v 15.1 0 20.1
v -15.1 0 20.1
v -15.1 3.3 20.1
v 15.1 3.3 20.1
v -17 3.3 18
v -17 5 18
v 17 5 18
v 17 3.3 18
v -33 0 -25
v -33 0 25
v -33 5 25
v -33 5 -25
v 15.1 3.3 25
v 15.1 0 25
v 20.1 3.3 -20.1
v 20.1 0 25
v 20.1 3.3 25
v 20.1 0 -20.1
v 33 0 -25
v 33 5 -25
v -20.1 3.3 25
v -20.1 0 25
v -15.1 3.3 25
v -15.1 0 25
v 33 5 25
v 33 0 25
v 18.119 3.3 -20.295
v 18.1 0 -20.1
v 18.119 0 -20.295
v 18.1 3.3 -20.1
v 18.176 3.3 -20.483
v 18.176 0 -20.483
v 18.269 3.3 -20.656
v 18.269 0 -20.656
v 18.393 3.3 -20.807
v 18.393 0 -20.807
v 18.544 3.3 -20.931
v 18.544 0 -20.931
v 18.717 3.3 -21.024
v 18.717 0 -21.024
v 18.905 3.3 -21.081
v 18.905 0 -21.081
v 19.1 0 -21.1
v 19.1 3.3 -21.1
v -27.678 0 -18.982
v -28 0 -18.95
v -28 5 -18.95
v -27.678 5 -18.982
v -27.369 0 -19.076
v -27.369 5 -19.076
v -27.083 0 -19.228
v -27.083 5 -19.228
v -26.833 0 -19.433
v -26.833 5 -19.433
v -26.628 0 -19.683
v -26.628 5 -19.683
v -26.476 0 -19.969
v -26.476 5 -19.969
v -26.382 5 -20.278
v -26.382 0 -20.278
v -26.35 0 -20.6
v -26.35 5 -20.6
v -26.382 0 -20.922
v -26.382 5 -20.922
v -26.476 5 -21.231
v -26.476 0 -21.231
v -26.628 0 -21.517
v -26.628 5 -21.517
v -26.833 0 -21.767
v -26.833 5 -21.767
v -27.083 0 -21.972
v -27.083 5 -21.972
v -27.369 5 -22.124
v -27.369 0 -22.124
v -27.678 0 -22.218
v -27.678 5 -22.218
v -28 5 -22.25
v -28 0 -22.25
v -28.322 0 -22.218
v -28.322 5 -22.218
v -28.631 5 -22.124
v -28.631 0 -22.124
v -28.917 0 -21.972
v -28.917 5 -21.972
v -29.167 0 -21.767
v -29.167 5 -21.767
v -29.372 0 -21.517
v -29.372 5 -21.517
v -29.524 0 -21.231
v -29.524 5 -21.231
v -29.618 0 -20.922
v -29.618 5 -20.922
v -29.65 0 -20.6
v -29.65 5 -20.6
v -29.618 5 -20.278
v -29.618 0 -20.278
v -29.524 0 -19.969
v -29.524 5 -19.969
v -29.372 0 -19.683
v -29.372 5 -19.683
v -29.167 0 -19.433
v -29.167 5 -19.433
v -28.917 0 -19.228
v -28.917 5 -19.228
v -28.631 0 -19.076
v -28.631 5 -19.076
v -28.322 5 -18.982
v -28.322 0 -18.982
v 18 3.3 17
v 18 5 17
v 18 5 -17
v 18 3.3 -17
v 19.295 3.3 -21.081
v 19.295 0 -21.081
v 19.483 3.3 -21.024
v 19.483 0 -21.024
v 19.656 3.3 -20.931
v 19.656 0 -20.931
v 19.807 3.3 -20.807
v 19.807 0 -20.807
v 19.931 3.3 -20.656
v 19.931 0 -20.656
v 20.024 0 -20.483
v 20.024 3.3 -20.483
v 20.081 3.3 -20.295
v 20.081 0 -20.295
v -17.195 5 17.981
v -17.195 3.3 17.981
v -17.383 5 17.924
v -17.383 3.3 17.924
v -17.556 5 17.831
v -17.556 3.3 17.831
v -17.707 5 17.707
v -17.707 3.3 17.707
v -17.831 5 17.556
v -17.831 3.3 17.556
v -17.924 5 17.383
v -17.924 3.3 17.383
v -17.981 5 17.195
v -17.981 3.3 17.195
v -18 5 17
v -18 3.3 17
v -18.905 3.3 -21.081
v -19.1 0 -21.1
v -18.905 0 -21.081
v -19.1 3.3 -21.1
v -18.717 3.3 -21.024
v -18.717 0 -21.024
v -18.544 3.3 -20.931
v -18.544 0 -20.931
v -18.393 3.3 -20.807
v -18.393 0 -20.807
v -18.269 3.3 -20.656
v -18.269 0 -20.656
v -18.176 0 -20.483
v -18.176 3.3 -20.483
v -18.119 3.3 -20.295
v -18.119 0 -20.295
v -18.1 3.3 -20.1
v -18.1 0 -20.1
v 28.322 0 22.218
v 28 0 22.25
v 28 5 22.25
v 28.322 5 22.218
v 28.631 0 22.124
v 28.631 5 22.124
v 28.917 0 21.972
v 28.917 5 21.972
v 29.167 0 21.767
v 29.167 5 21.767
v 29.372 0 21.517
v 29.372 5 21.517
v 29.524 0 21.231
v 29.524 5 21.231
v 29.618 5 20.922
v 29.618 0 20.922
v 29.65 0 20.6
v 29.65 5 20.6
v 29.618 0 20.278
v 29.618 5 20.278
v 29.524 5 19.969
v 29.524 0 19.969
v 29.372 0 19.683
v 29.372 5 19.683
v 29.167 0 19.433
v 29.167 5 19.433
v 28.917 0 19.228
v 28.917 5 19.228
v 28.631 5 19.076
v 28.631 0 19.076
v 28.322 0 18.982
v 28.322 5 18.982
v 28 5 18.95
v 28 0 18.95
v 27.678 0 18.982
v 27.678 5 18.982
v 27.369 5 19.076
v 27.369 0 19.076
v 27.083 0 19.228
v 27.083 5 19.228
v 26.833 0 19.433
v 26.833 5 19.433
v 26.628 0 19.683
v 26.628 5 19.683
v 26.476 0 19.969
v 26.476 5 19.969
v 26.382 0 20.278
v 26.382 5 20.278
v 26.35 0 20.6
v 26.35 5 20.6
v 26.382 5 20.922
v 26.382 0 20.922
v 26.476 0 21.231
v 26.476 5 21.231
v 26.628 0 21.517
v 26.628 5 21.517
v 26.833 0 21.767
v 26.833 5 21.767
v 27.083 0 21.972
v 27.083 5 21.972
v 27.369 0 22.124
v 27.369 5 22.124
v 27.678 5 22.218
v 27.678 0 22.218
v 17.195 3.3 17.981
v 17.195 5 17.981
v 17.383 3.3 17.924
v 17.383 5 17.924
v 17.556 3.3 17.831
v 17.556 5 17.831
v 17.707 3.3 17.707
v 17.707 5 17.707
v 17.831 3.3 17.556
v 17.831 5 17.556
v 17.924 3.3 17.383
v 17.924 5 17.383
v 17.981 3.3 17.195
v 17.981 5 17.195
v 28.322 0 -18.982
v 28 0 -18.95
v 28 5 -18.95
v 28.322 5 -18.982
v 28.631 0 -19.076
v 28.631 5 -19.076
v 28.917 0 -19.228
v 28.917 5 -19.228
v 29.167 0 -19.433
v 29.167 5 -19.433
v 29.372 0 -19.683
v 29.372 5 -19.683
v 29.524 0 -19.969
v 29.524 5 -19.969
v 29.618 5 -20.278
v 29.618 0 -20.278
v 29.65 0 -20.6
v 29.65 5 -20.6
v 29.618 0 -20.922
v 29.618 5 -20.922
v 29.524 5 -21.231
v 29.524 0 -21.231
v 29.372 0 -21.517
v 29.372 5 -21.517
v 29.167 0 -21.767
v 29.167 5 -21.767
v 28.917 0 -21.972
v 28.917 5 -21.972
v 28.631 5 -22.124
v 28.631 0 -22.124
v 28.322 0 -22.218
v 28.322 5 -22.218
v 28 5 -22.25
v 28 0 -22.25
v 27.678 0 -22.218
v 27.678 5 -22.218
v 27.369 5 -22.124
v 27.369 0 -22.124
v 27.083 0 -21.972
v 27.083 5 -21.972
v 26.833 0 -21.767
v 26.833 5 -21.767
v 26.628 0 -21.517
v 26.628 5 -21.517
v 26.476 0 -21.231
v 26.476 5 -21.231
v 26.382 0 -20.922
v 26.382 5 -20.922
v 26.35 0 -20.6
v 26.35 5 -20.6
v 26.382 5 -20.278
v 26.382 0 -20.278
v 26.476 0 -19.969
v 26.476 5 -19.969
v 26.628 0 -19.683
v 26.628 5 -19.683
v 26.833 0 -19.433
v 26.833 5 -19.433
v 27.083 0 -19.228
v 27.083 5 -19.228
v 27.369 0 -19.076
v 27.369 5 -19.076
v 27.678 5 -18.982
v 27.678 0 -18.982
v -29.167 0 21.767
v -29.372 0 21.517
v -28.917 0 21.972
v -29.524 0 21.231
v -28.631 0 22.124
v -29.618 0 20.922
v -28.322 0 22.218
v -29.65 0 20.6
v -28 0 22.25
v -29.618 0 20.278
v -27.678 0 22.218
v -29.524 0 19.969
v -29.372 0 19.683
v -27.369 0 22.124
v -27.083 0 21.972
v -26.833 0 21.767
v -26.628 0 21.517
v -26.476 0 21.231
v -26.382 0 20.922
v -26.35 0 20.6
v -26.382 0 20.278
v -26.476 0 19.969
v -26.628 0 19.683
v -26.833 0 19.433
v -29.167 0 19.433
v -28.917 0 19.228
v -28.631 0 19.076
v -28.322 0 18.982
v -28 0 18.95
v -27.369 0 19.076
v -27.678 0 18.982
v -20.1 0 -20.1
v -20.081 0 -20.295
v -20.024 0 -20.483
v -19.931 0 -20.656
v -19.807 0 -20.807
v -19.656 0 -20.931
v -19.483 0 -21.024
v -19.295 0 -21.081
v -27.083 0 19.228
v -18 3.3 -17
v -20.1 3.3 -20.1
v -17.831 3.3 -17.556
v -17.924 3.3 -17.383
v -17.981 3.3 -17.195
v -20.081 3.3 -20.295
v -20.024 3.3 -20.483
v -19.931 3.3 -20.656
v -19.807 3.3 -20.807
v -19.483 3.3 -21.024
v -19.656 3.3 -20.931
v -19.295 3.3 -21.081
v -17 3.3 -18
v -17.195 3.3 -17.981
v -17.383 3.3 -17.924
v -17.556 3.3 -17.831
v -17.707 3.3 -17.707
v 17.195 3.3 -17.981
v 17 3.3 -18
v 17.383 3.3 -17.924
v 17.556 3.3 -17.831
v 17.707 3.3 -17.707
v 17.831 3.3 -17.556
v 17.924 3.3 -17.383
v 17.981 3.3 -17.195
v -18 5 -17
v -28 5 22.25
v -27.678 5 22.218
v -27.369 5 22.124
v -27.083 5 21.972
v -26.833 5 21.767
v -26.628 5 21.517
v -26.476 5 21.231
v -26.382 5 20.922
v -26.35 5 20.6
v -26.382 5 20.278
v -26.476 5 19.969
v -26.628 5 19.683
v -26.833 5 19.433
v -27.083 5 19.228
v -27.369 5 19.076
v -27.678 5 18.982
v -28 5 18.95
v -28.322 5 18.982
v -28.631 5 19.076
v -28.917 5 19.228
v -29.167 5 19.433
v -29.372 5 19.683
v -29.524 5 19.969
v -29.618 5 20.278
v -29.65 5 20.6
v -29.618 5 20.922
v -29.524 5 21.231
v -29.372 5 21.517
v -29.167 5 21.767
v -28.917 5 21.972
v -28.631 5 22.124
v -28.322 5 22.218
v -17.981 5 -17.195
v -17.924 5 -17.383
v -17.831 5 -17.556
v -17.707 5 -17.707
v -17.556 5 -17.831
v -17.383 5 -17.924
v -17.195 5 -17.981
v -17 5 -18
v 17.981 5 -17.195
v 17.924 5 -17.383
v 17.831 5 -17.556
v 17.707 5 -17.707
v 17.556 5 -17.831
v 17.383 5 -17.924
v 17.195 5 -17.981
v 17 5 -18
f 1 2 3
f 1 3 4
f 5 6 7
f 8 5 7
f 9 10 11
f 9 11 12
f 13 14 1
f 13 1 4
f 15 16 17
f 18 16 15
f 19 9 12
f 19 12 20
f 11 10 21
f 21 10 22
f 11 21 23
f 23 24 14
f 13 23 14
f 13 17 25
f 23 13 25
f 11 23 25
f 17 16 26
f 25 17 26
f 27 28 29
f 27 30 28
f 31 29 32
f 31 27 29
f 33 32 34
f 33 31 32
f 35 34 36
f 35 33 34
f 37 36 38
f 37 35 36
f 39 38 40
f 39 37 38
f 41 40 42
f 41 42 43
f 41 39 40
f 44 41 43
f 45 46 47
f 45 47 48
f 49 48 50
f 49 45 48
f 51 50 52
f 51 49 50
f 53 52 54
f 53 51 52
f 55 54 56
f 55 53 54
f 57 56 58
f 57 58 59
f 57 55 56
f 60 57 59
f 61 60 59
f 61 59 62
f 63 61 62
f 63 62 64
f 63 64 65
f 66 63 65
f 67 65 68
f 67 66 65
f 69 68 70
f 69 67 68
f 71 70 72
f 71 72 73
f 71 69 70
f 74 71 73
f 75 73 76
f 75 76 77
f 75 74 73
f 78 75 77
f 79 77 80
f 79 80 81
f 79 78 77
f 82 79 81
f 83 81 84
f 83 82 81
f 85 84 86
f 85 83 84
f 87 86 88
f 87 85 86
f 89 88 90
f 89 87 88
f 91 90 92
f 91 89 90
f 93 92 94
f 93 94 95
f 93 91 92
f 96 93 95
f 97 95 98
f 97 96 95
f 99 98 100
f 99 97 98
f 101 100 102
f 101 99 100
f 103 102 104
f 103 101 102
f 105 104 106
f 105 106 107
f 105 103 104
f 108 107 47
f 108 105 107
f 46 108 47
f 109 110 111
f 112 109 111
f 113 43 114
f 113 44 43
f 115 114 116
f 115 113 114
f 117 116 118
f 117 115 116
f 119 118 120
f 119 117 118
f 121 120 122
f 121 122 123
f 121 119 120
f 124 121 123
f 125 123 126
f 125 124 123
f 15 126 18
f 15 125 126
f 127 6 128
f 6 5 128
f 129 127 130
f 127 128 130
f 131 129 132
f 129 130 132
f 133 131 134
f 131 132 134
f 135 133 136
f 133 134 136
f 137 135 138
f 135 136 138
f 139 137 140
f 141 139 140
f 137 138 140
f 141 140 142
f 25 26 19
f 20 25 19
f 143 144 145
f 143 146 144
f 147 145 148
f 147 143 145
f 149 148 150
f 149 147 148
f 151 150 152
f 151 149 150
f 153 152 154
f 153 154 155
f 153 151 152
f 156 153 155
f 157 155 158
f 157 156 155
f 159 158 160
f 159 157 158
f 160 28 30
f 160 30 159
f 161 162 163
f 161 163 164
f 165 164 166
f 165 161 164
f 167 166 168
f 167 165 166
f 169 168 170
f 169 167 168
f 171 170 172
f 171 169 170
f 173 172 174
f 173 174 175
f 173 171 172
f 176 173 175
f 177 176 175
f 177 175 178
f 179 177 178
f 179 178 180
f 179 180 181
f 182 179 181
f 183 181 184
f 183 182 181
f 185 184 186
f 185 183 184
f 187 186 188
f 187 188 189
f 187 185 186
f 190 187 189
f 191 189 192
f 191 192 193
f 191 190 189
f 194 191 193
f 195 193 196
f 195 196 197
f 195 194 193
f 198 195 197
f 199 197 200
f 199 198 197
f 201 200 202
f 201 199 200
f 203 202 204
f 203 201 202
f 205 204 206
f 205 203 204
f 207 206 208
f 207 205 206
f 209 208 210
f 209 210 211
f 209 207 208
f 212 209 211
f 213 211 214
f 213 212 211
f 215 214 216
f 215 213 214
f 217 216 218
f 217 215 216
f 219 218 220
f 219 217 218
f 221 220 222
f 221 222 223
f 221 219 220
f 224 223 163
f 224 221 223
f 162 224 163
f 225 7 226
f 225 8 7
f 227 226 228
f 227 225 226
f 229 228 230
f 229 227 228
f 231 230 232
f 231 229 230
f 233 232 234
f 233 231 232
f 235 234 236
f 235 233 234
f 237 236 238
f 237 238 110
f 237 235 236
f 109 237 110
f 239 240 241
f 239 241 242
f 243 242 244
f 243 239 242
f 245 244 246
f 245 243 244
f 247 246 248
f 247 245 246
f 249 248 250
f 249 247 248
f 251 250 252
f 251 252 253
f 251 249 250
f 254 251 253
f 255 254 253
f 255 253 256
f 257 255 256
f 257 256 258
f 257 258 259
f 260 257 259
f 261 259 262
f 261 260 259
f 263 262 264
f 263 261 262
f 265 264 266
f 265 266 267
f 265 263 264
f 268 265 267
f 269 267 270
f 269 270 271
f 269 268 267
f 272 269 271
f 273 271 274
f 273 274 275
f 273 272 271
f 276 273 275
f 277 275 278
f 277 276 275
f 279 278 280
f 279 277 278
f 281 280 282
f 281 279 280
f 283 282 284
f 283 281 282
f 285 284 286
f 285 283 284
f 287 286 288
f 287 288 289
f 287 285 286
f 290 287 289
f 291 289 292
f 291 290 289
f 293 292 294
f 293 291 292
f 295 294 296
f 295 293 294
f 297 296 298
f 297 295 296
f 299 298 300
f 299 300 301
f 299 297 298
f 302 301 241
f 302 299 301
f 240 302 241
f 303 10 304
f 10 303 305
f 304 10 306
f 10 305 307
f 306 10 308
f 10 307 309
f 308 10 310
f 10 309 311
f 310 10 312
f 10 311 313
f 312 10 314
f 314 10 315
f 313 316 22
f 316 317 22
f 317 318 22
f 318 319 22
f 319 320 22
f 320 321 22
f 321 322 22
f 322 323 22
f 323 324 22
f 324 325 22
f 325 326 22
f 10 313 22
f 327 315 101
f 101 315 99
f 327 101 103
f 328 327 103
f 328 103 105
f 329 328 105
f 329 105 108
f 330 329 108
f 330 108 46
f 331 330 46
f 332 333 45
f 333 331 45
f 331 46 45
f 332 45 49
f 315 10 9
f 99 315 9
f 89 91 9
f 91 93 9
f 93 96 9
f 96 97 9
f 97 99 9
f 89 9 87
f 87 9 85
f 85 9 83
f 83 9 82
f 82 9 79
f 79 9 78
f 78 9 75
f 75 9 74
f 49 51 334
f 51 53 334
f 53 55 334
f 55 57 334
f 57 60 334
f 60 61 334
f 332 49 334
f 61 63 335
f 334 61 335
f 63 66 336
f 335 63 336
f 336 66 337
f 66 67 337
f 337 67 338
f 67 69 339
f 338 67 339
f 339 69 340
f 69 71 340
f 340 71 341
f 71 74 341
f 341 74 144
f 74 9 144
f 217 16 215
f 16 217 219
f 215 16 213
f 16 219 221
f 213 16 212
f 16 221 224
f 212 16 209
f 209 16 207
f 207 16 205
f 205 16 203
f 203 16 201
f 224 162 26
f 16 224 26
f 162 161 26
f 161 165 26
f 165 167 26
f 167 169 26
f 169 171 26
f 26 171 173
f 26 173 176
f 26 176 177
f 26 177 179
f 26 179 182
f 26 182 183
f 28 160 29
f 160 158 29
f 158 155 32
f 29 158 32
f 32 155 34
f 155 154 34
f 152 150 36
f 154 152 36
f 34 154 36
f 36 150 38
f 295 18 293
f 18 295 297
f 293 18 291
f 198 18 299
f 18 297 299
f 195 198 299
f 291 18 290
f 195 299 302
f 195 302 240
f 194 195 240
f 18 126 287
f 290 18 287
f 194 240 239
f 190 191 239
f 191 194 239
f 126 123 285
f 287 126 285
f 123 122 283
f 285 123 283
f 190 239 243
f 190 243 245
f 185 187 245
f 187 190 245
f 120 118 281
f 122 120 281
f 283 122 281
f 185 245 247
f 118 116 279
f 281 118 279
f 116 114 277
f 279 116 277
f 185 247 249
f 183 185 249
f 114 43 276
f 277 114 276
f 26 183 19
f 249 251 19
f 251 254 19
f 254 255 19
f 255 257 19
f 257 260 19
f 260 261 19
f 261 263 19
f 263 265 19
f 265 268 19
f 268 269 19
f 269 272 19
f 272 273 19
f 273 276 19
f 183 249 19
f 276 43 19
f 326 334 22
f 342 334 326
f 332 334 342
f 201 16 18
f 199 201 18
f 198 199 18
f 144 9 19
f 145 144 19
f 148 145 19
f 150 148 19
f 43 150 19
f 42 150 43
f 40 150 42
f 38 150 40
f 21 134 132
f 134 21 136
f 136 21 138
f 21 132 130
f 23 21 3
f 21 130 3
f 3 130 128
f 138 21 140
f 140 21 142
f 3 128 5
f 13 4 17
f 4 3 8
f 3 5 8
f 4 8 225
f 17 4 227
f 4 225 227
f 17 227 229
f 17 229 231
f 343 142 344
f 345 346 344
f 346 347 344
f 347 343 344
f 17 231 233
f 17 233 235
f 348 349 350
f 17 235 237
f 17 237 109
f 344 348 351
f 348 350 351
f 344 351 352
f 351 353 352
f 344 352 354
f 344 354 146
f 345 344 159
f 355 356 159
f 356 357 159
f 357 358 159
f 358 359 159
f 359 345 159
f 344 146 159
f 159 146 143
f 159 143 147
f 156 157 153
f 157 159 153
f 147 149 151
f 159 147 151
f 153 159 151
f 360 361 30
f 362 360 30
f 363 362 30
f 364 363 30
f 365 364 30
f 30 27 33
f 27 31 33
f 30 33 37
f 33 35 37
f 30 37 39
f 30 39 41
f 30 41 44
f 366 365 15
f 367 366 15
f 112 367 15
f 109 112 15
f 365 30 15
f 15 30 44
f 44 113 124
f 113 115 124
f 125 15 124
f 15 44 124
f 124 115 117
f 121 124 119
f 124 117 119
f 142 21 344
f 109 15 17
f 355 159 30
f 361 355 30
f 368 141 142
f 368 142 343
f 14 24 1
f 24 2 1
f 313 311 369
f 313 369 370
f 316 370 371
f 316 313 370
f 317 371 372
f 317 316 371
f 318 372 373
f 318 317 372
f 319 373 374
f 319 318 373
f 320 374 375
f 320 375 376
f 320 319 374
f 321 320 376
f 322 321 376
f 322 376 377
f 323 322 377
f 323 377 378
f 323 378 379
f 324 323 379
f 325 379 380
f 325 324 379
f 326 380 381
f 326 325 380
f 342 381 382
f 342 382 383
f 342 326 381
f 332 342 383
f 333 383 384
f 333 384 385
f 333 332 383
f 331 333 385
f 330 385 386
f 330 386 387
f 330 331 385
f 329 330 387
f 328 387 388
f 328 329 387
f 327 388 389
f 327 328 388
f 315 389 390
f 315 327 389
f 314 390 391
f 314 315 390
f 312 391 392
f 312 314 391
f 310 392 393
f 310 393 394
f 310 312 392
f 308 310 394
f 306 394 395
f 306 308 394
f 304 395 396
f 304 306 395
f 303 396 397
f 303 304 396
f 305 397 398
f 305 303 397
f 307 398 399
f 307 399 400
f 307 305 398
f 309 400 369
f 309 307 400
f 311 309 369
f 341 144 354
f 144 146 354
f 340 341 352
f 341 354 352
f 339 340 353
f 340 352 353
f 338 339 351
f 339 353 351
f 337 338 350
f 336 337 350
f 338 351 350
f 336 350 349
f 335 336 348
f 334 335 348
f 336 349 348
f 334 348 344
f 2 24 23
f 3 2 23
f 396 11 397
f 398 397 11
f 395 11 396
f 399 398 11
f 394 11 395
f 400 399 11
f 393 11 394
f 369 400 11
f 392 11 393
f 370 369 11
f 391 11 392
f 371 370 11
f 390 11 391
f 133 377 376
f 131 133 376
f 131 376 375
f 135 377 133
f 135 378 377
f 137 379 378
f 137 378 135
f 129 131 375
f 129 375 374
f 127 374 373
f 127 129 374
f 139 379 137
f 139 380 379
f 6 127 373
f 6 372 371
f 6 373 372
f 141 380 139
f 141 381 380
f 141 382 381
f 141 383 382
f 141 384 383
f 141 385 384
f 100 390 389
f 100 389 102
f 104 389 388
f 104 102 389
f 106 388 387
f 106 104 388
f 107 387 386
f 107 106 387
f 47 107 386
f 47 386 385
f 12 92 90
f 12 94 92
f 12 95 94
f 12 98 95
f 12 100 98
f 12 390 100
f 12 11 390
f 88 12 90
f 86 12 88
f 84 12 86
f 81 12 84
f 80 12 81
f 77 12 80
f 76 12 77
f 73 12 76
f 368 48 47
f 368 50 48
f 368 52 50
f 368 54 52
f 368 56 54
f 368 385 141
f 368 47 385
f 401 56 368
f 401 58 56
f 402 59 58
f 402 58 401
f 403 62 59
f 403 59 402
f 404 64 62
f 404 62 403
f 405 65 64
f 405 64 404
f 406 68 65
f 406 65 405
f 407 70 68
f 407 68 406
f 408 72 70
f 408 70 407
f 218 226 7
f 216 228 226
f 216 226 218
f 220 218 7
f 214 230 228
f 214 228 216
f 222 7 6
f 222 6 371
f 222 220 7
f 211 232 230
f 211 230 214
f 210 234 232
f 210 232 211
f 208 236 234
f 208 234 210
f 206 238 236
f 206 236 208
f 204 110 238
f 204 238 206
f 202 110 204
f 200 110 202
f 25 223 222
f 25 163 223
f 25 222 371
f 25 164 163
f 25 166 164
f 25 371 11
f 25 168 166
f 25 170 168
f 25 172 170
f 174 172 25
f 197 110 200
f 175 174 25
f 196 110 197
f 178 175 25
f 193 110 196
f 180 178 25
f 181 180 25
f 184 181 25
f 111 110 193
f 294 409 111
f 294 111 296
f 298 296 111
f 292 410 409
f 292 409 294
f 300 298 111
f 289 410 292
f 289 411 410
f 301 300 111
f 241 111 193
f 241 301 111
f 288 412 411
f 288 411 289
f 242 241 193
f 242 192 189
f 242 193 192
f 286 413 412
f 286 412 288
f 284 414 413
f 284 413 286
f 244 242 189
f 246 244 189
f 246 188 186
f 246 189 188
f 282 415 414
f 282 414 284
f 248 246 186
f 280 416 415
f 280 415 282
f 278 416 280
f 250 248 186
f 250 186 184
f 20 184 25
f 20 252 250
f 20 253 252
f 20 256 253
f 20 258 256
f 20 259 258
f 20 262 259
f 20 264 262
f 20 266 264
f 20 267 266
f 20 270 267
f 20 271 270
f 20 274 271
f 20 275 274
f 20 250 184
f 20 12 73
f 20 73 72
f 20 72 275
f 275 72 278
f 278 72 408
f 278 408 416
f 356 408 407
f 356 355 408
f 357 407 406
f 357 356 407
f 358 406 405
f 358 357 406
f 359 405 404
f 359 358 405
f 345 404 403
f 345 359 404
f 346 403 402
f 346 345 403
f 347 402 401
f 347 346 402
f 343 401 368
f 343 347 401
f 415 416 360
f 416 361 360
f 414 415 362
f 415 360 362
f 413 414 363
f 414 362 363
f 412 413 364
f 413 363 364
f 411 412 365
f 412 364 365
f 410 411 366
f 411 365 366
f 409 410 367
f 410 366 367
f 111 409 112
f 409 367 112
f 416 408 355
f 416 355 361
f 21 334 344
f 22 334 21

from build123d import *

# Parameters (mm, degrees)
SKETCH1_W           = 66
SKETCH1_H           = 50
SKETCH1_R           = 1.65
BOSS_EXTRUDE1_DEPTH = 5
SKETCH2_W           = 36
SKETCH2_H           = 36
BOSS_EXTRUDE2_DEPTH = 1.7
CUT_EXTRUDE1_REACH  = 62.117
SKETCH3_W           = 5
SKETCH3_H           = 3.3
FILLET1_R           = 1


with BuildPart() as part:
    # Sketch1 → Boss-Extrude1 (new body)
    with BuildSketch(Plane(origin=(0, 0, 0), x_dir=(1, 0, 0), z_dir=(0, 1, 0))):
        Rectangle(SKETCH1_W, SKETCH1_H)
        with Locations(Location((-28, 20.6, 0), (0, 0, 270))):
            Circle(SKETCH1_R, mode=Mode.SUBTRACT)
        with Locations(Location((28, 20.6, 0), (0, 0, 270))):
            Circle(SKETCH1_R, mode=Mode.SUBTRACT)
        with Locations(Location((-28, -20.6, 0), (0, 0, 270))):
            Circle(SKETCH1_R, mode=Mode.SUBTRACT)
        with Locations(Location((28, -20.6, 0), (0, 0, 270))):
            Circle(SKETCH1_R, mode=Mode.SUBTRACT)
        Polygon((20.1, -20.1), (20.1, 21.1), (18.1, 21.1), (18.1, 20.1), (-18.1, 20.1), (-18.1, 21.1), (-20.1, 21.1), (-20.1, -20.1), align=None, mode=Mode.SUBTRACT)
    extrude(amount=BOSS_EXTRUDE1_DEPTH)

    # Sketch2 → Boss-Extrude2 (add)
    with BuildSketch(Plane(origin=(0, 5, 0), x_dir=(1, 0, 0), z_dir=(0, 1, 0))):
        Polygon((-20.1, 21.1), (-20.1, -20.1), (20.1, -20.1), (20.1, 21.1), (18.1, 21.1), (18.1, 20.1), (-18.1, 20.1), (-18.1, 21.1), align=None)
        Rectangle(SKETCH2_W, SKETCH2_H, mode=Mode.SUBTRACT)
    extrude(amount=-BOSS_EXTRUDE2_DEPTH)

    # Sketch3 → Cut-Extrude1 (cut, up to next)
    with BuildSketch(Plane.XY.offset(25), mode=Mode.PRIVATE) as cut_extrude1_sk1:
        with Locations((-17.6, 1.65)):
            Rectangle(SKETCH3_W, SKETCH3_H)
    cut_extrude1_tool1 = extrude(cut_extrude1_sk1.sketch, amount=-CUT_EXTRUDE1_REACH, mode=Mode.PRIVATE) & part.part
    # Sketch3 → Cut-Extrude1 (cut, up to next)
    with BuildSketch(Plane.XY.offset(25), mode=Mode.PRIVATE) as cut_extrude1_sk2:
        with Locations((17.6, 1.65)):
            Rectangle(SKETCH3_W, SKETCH3_H)
    cut_extrude1_tool2 = extrude(cut_extrude1_sk2.sketch, amount=-CUT_EXTRUDE1_REACH, mode=Mode.PRIVATE) & part.part
    add(cut_extrude1_tool1.solids().sort_by_distance((-17.6, 1.65, 25))[0], mode=Mode.SUBTRACT)
    add(cut_extrude1_tool2.solids().sort_by_distance((17.6, 1.65, 25))[0], mode=Mode.SUBTRACT)

    # Fillet1
    fillet1_edges = [part.edges().sort_by_distance(p)[0] for p in [
        (-18, 4.15, 18),
        (18, 4.15, 18),
        (18, 4.15, -18),
        (-18, 4.15, -18),
        (-20.1, 1.65, -21.1),
        (-18.1, 1.65, -21.1),
        (18.1, 1.65, -21.1),
        (20.1, 1.65, -21.1),
    ]]
    fillet(fillet1_edges, radius=FILLET1_R - 0.0001)  # a hair under: the kernel refuses the full size


solid = part.part
